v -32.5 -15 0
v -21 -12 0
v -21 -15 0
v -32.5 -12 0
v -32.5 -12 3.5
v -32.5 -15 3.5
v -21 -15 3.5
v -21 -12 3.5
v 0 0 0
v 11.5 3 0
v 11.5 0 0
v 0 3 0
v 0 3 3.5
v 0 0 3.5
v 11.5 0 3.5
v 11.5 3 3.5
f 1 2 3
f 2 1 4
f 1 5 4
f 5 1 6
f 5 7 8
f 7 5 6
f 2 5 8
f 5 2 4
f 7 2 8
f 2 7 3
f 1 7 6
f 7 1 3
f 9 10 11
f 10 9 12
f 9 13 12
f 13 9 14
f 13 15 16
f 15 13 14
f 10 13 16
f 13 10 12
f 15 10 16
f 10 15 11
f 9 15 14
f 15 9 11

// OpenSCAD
/*
    Author: Kevin Lutzer
    Date Created: January 16 2018
    Description: The bottom for a raspberry pi W case
*/

/////////////////////////////////////////////////// Parameters /////////////////////////////////////////////////

case_thickness = 4;
rpi_width = 70;
rpi_length = 25;

case_width = 2*case_thickness + rpi_width;
case_length = 2*case_thickness + rpi_length;

standoff_height = 5;
standoff_width = 5;

board_height = 2;

hmdi_connector_height = 4; // the max clearence needed

rpi_base_length = 65;
rpi_base_width = 30;
rpi_base_corner_radius = 3;
rpi_standoff_diameter = 6;
rpi_standoff_screw_diameter = 2.75;
rpi_standoff_height = 3;
rpi_header_height = 9;
rpi_thickness = 1.5;


rpi_case_wall_thickness = 3;
rpi_case_bottom_height = rpi_header_height + rpi_standoff_height;
rpi_case_width = 2*rpi_case_wall_thickness + rpi_base_width;
rpi_case_length = 2*rpi_case_wall_thickness + rpi_base_length;
rpi_case_hole_radius = 4;

hdmi_port_length = 11.5;
hdmi_port_height = 3.5;
usb_port_length = 8;

/////////////////////////////////////////////////// Modules //////////////////////////////////////////////////

module rpi_corner_standoff() {
    linear_extrude(height=rpi_standoff_height){
      difference() {
        circle(d=rpi_standoff_diameter, $fn=100);
        circle(d=rpi_standoff_screw_diameter, $fn=100);
      }
  }
}

module rpi_base_cutout() {
   	hull()
	{
		// place 4 circles in the corners, with the given radius
		translate([(-rpi_base_length/2)+(rpi_base_corner_radius/2), (-rpi_base_width/2)+(rpi_base_corner_radius/2), 0])
		circle(r=rpi_base_corner_radius, $fn=100);
	
		translate([(rpi_base_length/2)-(rpi_base_corner_radius/2), (-rpi_base_width/2)+(rpi_base_corner_radius/2), 0])
		circle(r=rpi_base_corner_radius, $fn=100);
	
		translate([(-rpi_base_length/2)+(rpi_base_corner_radius/2), (rpi_base_width/2)-(rpi_base_corner_radius/2), 0])
		circle(r=rpi_base_corner_radius, $fn=100);
	
		translate([(rpi_base_length/2)-(rpi_base_corner_radius/2), (rpi_base_width/2)-(rpi_base_corner_radius/2), 0])
		circle(r=rpi_base_corner_radius, $fn=100);
	}
}

module rpi_base_corner_standoffs() {
      translate([(-rpi_base_length/2)+(rpi_base_corner_radius/2), (-rpi_base_width/2)+(rpi_base_corner_radius/2), 0])
      rpi_corner_standoff();
  
      translate([(rpi_base_length/2)-(rpi_base_corner_radius/2), (-rpi_base_width/2)+(rpi_base_corner_radius/2), 0])
      rpi_corner_standoff();
  
      translate([(-rpi_base_length/2)+(rpi_base_corner_radius/2), (rpi_base_width/2)-(rpi_base_corner_radius/2), 0])
      rpi_corner_standoff();
  
      translate([(rpi_base_length/2)-(rpi_base_corner_radius/2), (rpi_base_width/2)-(rpi_base_corner_radius/2), 0])
      rpi_corner_standoff();
}

module rpi_case_base() {
  translate([-rpi_case_length/2, -rpi_case_width/2]) {
    square([rpi_case_length, rpi_case_width]);
  }
}

module rpi_case_bottom() {
  union() {
    translate([0,0,rpi_case_wall_thickness]) {
        linear_extrude(height=rpi_case_bottom_height) {
          difference() {
              rpi_case_base();
              rpi_base_cutout();
          }
        }
      rpi_base_corner_standoffs();
    }
    linear_extrude(height=rpi_case_wall_thickness) {
      rpi_case_base();
    }
  }
}

module rpi_case_mount() {
  linear_extrude(height=rpi_case_wall_thickness) {
    difference() {
        square([4*rpi_case_hole_radius, 4*rpi_case_hole_radius]);
        translate([2*rpi_case_hole_radius, 2*rpi_case_hole_radius]) circle(r=rpi_case_hole_radius, $fn=100);
    }
  }
}

module rpi_case_mounts() {
  translate([rpi_case_length/2, - 2*rpi_case_hole_radius, 0]) rpi_case_mount();
  translate([-rpi_case_length/2 - 4 *rpi_case_hole_radius, - 2*rpi_case_hole_radius, 0]) rpi_case_mount();
}

module rpi_peripherals_case_bottom_cutout() {
  translate([-rpi_base_length/2, -rpi_base_width/2])
  linear_extrude(height=hdmi_port_height) {
    square([hdmi_port_length, rpi_case_wall_thickness]);
  }
  
  linear_extrude(height=hdmi_port_height) {
    square([hdmi_port_length, rpi_case_wall_thickness]);
  }
}

/////////////////////////////////////////////////// Prototypes /////////////////////////////////////////////////

//case_bottom();
//rpi_base_cutout();
//rpi_base_corner_standoffs();
//rpi_corner_standoff();
//rpi_corner_standoff();
//rpi_base_corner_standoffs();
//rpi_case_bottom();
//rpi_case_mount();
rpi_peripherals_case_bottom_cutout();
//rpi_case_mounts();
